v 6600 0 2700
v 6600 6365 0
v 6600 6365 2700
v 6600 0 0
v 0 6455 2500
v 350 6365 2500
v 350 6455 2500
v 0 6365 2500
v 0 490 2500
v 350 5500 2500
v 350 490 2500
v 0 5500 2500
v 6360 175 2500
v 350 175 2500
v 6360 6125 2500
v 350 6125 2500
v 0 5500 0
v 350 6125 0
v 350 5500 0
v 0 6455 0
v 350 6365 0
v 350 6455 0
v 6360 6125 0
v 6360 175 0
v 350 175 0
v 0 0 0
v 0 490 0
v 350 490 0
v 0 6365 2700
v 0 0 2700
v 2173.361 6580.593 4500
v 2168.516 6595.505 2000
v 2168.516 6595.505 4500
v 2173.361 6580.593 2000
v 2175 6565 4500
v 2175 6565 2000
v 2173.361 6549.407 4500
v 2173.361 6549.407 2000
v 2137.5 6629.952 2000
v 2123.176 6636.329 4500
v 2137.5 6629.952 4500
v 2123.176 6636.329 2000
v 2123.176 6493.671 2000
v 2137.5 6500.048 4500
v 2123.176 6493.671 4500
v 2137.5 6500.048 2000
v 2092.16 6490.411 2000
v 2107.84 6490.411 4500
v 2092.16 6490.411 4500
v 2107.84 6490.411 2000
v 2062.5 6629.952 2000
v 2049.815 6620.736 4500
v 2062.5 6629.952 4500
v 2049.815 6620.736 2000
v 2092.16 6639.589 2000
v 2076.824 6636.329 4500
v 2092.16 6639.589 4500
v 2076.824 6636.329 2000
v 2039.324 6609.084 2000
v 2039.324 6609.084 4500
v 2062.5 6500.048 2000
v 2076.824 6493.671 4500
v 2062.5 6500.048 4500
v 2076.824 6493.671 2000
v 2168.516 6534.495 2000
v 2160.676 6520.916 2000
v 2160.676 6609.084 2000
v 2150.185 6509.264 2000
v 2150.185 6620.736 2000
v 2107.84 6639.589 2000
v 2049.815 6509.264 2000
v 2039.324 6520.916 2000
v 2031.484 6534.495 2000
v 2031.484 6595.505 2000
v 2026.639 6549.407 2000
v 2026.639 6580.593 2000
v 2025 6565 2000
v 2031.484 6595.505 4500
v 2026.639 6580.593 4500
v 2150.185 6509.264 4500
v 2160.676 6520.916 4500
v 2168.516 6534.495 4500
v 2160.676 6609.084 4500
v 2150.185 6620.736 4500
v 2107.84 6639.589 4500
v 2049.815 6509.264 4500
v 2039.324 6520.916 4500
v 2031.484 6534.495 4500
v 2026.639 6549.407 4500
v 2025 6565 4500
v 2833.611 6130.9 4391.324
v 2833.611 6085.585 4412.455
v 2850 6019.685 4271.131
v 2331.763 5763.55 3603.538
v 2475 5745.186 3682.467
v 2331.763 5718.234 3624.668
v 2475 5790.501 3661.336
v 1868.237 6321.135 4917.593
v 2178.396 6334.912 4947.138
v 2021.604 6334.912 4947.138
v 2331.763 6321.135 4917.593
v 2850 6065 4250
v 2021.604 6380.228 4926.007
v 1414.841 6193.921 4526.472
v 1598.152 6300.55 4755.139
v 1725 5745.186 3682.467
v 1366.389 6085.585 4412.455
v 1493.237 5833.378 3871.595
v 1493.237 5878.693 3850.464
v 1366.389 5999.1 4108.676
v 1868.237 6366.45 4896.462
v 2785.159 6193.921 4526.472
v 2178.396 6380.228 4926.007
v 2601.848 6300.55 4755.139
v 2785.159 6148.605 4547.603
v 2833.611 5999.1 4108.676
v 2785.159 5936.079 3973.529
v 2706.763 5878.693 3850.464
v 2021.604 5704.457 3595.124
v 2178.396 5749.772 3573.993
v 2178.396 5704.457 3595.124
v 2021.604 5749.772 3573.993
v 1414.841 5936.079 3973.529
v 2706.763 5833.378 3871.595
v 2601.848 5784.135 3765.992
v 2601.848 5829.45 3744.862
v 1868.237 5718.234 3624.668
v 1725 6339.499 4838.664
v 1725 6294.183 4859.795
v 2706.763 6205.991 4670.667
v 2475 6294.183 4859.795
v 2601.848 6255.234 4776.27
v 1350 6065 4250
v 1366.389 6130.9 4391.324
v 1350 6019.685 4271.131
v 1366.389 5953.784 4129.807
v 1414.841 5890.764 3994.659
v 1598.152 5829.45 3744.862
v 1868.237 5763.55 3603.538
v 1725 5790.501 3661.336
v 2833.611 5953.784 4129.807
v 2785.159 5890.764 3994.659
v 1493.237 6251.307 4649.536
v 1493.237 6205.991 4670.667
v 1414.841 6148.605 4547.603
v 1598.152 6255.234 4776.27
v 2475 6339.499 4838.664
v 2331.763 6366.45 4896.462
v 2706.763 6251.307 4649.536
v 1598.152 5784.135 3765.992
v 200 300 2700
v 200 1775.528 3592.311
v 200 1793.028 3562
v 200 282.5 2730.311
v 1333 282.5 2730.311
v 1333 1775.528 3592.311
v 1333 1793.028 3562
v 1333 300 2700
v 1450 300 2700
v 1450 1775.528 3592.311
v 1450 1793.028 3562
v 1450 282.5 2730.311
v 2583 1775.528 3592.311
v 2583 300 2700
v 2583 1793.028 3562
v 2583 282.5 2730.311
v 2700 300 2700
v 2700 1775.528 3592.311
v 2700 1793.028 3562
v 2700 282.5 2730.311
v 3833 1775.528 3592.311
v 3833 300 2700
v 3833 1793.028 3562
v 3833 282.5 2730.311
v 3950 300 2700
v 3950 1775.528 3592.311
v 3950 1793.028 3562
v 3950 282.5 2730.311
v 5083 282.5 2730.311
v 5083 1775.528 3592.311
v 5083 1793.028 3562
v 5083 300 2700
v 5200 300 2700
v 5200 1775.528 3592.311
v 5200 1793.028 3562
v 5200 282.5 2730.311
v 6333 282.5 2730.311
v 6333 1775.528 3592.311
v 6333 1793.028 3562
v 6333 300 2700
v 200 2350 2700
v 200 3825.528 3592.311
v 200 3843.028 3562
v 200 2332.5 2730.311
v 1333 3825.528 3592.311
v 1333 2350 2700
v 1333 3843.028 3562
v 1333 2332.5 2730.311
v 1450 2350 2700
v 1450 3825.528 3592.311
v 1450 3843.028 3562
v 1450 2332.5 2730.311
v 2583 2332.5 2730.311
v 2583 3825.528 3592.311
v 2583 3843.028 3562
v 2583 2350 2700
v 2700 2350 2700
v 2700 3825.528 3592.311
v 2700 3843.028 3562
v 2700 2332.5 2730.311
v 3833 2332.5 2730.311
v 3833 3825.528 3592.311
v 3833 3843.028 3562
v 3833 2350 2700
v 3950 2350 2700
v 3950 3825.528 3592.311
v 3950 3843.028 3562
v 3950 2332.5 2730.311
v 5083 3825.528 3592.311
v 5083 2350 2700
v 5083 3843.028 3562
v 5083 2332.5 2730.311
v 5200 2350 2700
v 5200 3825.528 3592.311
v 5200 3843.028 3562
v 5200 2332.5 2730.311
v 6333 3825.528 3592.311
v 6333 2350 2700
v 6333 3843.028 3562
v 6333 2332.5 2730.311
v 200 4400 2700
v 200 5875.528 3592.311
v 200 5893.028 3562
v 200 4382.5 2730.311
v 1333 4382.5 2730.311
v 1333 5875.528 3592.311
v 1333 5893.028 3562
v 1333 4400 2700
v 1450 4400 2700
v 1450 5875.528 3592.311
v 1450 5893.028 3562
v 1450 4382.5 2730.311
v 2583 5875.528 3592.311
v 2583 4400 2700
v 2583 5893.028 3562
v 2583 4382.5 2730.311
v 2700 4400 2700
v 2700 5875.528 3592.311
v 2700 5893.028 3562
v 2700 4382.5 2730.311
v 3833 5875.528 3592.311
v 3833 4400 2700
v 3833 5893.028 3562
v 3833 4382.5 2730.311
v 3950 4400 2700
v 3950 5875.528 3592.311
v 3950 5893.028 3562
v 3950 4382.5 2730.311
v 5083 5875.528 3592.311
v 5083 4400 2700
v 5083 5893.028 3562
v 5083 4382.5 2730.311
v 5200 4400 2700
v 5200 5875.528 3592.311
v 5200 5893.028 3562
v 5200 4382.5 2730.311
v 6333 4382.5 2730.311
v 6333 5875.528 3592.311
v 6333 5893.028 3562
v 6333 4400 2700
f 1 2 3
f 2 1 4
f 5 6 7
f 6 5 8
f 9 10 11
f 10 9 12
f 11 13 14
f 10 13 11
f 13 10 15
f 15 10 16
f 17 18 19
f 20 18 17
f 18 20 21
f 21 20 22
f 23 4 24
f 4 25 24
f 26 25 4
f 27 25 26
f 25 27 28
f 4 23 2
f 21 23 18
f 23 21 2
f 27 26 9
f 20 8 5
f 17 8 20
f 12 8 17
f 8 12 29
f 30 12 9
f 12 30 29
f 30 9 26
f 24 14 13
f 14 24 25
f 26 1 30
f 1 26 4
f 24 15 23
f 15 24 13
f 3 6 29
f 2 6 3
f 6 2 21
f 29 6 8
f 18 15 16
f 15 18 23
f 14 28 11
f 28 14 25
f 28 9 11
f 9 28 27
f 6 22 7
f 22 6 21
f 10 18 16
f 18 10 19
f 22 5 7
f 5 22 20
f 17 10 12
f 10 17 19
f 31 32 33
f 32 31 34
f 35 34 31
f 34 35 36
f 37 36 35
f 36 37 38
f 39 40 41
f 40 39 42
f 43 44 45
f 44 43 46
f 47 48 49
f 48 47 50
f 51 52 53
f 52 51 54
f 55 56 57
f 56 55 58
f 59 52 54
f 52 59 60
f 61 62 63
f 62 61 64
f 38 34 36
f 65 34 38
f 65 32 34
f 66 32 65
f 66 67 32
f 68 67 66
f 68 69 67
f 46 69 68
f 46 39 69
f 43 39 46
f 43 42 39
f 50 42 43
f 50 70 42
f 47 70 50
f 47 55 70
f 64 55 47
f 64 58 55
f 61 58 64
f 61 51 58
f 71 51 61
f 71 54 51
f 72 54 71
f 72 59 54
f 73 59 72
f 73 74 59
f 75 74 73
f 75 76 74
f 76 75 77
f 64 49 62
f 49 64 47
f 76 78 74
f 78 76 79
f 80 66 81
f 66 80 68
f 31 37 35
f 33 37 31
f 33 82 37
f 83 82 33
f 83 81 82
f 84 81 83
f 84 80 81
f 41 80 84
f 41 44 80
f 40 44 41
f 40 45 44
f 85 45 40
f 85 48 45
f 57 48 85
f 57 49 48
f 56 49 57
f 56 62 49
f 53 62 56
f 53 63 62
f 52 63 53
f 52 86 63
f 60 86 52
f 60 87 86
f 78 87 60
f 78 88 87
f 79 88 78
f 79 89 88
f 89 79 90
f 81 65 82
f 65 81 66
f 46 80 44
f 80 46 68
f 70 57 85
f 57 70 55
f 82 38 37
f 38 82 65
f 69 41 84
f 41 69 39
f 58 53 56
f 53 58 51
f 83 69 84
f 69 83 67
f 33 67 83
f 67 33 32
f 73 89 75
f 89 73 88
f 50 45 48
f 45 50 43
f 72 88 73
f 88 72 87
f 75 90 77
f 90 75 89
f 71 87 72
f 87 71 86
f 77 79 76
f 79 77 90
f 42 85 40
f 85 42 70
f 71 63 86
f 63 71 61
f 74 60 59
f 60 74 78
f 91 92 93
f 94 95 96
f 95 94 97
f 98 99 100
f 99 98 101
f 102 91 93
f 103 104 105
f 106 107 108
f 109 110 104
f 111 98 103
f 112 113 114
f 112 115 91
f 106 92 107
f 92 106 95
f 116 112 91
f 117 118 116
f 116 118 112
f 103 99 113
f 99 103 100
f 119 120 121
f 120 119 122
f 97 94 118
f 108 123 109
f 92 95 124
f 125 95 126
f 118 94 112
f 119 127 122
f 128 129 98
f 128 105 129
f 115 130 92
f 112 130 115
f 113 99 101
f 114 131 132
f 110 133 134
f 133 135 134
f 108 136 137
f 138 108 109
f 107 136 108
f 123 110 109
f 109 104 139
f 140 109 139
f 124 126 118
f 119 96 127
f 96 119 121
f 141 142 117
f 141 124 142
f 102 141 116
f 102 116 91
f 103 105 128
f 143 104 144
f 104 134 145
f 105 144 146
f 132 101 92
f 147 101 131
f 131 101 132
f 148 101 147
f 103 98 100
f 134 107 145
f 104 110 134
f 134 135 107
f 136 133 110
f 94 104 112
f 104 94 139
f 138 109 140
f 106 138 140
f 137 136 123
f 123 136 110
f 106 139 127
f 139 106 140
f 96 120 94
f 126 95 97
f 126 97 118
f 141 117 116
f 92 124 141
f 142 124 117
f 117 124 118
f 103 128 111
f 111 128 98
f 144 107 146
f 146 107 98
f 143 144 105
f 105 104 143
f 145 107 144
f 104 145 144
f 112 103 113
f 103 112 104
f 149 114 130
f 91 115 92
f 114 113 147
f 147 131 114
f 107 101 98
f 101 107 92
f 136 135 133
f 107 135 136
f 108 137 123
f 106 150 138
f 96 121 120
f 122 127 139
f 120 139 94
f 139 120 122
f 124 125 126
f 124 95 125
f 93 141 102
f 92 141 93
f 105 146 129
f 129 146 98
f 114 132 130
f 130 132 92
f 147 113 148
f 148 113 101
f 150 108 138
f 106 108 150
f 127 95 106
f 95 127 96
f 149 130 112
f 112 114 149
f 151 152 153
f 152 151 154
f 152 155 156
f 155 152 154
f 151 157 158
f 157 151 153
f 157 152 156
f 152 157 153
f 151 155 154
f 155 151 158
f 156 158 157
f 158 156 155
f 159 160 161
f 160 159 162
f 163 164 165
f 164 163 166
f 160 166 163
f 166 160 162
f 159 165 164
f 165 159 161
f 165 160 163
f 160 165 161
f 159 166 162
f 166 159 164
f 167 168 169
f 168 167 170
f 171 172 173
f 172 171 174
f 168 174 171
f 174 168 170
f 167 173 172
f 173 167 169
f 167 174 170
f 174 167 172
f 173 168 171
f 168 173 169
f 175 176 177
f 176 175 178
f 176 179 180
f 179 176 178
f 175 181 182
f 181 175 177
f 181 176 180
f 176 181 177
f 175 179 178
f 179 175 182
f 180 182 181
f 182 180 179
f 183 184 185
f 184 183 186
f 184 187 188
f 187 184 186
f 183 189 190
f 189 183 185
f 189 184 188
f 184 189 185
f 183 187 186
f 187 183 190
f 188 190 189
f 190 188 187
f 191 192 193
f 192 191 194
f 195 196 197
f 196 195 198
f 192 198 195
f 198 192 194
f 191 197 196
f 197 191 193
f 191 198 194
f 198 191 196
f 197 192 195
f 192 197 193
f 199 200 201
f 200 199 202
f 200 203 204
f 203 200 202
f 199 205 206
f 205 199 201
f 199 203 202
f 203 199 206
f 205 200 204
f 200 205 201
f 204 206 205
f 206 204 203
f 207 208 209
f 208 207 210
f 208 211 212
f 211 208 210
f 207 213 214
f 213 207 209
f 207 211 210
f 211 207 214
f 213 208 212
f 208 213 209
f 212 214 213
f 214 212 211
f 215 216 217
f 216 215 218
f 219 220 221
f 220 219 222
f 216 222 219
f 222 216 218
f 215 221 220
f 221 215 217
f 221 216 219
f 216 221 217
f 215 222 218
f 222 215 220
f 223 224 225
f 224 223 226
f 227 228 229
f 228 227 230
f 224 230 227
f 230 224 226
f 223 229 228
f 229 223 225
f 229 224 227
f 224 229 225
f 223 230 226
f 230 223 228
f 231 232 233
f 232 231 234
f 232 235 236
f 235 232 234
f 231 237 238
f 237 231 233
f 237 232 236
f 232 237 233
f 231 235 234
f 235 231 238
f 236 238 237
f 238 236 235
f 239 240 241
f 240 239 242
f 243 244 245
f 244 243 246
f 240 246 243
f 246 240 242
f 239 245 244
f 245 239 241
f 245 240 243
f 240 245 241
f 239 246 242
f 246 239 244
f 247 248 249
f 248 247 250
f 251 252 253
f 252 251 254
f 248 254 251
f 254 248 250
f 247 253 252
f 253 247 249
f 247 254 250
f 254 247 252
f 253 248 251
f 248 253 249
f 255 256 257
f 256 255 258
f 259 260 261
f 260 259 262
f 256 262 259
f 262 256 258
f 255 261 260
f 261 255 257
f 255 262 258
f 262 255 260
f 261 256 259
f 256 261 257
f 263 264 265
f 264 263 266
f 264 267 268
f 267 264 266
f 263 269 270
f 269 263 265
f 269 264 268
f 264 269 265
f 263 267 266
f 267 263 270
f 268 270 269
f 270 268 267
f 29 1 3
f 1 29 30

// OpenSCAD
wallheight = 2500;
color([0.85, 0.85, 0.85]) {
  // Wand Süden
  cube([6600, 175, wallheight]);
  // Wand Osten
  translate([6600, 0, 0]) rotate([0, 0, 90]) cube([6365, 240, wallheight]);
  // Wand Norden
  translate([0, 6365-240, 0]) cube([6600, 240, wallheight]);
  // Wand Westen
  cube([350, 490, wallheight]);
  translate([0, 490+5010, 0]) cube([350, 955, wallheight]);
}
// Dach
color([0.15, 0.15, 0.15]) translate([0, 0, wallheight]) cube([6600, 6365, 200]);
// Sattelit
translate([2100, 6365 + 200, 2000]) {
  cylinder(h = 2500, d = 150);
  translate([0, -500, 2250]) rotate([65, 0, 0]) cylinder(h = 50, d = 1500);
}

//panels einseitig schräg
module panels1(maxi = 2, maxj = 4) {
  for ( i = [0 : maxi] ){
    for ( j = [0 : maxj] ){
      translate([j * 1250, i * 2050, 0])
        rotate([30, 0, 0])
        cube([1133, 1724, 35]);
    }
  }
}
//panels einseitig schräg
module panels2(maxi = 2, maxj = 2) {
  for ( i = [0 : maxi] ){
    for ( j = [0 : maxj] ){
      translate([j * 2550, i * 2050, 0]) {
        rotate([0, -10, 0])
          cube([1133, 1724, 35]);
      }
    }
  }
  for ( i = [0 : maxi] ){
    for ( j = [0 : maxj-1] ){
      translate([j * 2550, i * 2050, 0]) {
        translate([1133*2 + 50, 1724, 0])
          rotate([0, -10, 180])
          cube([1133, 1724, 35]);
      }
    }
  }
}
translate([200, 300, wallheight + 200]) panels1();
//translate([200, 300, wallheight + 200]) panels2();

//checks
//innenmaß nord süd
//color("red") translate([2000, 175, 0]) cube([20, 5950, wallheight]);
//innenmaß west ost
//color("green") translate([350, 2000, 0]) cube([6010, 20, wallheight]);
